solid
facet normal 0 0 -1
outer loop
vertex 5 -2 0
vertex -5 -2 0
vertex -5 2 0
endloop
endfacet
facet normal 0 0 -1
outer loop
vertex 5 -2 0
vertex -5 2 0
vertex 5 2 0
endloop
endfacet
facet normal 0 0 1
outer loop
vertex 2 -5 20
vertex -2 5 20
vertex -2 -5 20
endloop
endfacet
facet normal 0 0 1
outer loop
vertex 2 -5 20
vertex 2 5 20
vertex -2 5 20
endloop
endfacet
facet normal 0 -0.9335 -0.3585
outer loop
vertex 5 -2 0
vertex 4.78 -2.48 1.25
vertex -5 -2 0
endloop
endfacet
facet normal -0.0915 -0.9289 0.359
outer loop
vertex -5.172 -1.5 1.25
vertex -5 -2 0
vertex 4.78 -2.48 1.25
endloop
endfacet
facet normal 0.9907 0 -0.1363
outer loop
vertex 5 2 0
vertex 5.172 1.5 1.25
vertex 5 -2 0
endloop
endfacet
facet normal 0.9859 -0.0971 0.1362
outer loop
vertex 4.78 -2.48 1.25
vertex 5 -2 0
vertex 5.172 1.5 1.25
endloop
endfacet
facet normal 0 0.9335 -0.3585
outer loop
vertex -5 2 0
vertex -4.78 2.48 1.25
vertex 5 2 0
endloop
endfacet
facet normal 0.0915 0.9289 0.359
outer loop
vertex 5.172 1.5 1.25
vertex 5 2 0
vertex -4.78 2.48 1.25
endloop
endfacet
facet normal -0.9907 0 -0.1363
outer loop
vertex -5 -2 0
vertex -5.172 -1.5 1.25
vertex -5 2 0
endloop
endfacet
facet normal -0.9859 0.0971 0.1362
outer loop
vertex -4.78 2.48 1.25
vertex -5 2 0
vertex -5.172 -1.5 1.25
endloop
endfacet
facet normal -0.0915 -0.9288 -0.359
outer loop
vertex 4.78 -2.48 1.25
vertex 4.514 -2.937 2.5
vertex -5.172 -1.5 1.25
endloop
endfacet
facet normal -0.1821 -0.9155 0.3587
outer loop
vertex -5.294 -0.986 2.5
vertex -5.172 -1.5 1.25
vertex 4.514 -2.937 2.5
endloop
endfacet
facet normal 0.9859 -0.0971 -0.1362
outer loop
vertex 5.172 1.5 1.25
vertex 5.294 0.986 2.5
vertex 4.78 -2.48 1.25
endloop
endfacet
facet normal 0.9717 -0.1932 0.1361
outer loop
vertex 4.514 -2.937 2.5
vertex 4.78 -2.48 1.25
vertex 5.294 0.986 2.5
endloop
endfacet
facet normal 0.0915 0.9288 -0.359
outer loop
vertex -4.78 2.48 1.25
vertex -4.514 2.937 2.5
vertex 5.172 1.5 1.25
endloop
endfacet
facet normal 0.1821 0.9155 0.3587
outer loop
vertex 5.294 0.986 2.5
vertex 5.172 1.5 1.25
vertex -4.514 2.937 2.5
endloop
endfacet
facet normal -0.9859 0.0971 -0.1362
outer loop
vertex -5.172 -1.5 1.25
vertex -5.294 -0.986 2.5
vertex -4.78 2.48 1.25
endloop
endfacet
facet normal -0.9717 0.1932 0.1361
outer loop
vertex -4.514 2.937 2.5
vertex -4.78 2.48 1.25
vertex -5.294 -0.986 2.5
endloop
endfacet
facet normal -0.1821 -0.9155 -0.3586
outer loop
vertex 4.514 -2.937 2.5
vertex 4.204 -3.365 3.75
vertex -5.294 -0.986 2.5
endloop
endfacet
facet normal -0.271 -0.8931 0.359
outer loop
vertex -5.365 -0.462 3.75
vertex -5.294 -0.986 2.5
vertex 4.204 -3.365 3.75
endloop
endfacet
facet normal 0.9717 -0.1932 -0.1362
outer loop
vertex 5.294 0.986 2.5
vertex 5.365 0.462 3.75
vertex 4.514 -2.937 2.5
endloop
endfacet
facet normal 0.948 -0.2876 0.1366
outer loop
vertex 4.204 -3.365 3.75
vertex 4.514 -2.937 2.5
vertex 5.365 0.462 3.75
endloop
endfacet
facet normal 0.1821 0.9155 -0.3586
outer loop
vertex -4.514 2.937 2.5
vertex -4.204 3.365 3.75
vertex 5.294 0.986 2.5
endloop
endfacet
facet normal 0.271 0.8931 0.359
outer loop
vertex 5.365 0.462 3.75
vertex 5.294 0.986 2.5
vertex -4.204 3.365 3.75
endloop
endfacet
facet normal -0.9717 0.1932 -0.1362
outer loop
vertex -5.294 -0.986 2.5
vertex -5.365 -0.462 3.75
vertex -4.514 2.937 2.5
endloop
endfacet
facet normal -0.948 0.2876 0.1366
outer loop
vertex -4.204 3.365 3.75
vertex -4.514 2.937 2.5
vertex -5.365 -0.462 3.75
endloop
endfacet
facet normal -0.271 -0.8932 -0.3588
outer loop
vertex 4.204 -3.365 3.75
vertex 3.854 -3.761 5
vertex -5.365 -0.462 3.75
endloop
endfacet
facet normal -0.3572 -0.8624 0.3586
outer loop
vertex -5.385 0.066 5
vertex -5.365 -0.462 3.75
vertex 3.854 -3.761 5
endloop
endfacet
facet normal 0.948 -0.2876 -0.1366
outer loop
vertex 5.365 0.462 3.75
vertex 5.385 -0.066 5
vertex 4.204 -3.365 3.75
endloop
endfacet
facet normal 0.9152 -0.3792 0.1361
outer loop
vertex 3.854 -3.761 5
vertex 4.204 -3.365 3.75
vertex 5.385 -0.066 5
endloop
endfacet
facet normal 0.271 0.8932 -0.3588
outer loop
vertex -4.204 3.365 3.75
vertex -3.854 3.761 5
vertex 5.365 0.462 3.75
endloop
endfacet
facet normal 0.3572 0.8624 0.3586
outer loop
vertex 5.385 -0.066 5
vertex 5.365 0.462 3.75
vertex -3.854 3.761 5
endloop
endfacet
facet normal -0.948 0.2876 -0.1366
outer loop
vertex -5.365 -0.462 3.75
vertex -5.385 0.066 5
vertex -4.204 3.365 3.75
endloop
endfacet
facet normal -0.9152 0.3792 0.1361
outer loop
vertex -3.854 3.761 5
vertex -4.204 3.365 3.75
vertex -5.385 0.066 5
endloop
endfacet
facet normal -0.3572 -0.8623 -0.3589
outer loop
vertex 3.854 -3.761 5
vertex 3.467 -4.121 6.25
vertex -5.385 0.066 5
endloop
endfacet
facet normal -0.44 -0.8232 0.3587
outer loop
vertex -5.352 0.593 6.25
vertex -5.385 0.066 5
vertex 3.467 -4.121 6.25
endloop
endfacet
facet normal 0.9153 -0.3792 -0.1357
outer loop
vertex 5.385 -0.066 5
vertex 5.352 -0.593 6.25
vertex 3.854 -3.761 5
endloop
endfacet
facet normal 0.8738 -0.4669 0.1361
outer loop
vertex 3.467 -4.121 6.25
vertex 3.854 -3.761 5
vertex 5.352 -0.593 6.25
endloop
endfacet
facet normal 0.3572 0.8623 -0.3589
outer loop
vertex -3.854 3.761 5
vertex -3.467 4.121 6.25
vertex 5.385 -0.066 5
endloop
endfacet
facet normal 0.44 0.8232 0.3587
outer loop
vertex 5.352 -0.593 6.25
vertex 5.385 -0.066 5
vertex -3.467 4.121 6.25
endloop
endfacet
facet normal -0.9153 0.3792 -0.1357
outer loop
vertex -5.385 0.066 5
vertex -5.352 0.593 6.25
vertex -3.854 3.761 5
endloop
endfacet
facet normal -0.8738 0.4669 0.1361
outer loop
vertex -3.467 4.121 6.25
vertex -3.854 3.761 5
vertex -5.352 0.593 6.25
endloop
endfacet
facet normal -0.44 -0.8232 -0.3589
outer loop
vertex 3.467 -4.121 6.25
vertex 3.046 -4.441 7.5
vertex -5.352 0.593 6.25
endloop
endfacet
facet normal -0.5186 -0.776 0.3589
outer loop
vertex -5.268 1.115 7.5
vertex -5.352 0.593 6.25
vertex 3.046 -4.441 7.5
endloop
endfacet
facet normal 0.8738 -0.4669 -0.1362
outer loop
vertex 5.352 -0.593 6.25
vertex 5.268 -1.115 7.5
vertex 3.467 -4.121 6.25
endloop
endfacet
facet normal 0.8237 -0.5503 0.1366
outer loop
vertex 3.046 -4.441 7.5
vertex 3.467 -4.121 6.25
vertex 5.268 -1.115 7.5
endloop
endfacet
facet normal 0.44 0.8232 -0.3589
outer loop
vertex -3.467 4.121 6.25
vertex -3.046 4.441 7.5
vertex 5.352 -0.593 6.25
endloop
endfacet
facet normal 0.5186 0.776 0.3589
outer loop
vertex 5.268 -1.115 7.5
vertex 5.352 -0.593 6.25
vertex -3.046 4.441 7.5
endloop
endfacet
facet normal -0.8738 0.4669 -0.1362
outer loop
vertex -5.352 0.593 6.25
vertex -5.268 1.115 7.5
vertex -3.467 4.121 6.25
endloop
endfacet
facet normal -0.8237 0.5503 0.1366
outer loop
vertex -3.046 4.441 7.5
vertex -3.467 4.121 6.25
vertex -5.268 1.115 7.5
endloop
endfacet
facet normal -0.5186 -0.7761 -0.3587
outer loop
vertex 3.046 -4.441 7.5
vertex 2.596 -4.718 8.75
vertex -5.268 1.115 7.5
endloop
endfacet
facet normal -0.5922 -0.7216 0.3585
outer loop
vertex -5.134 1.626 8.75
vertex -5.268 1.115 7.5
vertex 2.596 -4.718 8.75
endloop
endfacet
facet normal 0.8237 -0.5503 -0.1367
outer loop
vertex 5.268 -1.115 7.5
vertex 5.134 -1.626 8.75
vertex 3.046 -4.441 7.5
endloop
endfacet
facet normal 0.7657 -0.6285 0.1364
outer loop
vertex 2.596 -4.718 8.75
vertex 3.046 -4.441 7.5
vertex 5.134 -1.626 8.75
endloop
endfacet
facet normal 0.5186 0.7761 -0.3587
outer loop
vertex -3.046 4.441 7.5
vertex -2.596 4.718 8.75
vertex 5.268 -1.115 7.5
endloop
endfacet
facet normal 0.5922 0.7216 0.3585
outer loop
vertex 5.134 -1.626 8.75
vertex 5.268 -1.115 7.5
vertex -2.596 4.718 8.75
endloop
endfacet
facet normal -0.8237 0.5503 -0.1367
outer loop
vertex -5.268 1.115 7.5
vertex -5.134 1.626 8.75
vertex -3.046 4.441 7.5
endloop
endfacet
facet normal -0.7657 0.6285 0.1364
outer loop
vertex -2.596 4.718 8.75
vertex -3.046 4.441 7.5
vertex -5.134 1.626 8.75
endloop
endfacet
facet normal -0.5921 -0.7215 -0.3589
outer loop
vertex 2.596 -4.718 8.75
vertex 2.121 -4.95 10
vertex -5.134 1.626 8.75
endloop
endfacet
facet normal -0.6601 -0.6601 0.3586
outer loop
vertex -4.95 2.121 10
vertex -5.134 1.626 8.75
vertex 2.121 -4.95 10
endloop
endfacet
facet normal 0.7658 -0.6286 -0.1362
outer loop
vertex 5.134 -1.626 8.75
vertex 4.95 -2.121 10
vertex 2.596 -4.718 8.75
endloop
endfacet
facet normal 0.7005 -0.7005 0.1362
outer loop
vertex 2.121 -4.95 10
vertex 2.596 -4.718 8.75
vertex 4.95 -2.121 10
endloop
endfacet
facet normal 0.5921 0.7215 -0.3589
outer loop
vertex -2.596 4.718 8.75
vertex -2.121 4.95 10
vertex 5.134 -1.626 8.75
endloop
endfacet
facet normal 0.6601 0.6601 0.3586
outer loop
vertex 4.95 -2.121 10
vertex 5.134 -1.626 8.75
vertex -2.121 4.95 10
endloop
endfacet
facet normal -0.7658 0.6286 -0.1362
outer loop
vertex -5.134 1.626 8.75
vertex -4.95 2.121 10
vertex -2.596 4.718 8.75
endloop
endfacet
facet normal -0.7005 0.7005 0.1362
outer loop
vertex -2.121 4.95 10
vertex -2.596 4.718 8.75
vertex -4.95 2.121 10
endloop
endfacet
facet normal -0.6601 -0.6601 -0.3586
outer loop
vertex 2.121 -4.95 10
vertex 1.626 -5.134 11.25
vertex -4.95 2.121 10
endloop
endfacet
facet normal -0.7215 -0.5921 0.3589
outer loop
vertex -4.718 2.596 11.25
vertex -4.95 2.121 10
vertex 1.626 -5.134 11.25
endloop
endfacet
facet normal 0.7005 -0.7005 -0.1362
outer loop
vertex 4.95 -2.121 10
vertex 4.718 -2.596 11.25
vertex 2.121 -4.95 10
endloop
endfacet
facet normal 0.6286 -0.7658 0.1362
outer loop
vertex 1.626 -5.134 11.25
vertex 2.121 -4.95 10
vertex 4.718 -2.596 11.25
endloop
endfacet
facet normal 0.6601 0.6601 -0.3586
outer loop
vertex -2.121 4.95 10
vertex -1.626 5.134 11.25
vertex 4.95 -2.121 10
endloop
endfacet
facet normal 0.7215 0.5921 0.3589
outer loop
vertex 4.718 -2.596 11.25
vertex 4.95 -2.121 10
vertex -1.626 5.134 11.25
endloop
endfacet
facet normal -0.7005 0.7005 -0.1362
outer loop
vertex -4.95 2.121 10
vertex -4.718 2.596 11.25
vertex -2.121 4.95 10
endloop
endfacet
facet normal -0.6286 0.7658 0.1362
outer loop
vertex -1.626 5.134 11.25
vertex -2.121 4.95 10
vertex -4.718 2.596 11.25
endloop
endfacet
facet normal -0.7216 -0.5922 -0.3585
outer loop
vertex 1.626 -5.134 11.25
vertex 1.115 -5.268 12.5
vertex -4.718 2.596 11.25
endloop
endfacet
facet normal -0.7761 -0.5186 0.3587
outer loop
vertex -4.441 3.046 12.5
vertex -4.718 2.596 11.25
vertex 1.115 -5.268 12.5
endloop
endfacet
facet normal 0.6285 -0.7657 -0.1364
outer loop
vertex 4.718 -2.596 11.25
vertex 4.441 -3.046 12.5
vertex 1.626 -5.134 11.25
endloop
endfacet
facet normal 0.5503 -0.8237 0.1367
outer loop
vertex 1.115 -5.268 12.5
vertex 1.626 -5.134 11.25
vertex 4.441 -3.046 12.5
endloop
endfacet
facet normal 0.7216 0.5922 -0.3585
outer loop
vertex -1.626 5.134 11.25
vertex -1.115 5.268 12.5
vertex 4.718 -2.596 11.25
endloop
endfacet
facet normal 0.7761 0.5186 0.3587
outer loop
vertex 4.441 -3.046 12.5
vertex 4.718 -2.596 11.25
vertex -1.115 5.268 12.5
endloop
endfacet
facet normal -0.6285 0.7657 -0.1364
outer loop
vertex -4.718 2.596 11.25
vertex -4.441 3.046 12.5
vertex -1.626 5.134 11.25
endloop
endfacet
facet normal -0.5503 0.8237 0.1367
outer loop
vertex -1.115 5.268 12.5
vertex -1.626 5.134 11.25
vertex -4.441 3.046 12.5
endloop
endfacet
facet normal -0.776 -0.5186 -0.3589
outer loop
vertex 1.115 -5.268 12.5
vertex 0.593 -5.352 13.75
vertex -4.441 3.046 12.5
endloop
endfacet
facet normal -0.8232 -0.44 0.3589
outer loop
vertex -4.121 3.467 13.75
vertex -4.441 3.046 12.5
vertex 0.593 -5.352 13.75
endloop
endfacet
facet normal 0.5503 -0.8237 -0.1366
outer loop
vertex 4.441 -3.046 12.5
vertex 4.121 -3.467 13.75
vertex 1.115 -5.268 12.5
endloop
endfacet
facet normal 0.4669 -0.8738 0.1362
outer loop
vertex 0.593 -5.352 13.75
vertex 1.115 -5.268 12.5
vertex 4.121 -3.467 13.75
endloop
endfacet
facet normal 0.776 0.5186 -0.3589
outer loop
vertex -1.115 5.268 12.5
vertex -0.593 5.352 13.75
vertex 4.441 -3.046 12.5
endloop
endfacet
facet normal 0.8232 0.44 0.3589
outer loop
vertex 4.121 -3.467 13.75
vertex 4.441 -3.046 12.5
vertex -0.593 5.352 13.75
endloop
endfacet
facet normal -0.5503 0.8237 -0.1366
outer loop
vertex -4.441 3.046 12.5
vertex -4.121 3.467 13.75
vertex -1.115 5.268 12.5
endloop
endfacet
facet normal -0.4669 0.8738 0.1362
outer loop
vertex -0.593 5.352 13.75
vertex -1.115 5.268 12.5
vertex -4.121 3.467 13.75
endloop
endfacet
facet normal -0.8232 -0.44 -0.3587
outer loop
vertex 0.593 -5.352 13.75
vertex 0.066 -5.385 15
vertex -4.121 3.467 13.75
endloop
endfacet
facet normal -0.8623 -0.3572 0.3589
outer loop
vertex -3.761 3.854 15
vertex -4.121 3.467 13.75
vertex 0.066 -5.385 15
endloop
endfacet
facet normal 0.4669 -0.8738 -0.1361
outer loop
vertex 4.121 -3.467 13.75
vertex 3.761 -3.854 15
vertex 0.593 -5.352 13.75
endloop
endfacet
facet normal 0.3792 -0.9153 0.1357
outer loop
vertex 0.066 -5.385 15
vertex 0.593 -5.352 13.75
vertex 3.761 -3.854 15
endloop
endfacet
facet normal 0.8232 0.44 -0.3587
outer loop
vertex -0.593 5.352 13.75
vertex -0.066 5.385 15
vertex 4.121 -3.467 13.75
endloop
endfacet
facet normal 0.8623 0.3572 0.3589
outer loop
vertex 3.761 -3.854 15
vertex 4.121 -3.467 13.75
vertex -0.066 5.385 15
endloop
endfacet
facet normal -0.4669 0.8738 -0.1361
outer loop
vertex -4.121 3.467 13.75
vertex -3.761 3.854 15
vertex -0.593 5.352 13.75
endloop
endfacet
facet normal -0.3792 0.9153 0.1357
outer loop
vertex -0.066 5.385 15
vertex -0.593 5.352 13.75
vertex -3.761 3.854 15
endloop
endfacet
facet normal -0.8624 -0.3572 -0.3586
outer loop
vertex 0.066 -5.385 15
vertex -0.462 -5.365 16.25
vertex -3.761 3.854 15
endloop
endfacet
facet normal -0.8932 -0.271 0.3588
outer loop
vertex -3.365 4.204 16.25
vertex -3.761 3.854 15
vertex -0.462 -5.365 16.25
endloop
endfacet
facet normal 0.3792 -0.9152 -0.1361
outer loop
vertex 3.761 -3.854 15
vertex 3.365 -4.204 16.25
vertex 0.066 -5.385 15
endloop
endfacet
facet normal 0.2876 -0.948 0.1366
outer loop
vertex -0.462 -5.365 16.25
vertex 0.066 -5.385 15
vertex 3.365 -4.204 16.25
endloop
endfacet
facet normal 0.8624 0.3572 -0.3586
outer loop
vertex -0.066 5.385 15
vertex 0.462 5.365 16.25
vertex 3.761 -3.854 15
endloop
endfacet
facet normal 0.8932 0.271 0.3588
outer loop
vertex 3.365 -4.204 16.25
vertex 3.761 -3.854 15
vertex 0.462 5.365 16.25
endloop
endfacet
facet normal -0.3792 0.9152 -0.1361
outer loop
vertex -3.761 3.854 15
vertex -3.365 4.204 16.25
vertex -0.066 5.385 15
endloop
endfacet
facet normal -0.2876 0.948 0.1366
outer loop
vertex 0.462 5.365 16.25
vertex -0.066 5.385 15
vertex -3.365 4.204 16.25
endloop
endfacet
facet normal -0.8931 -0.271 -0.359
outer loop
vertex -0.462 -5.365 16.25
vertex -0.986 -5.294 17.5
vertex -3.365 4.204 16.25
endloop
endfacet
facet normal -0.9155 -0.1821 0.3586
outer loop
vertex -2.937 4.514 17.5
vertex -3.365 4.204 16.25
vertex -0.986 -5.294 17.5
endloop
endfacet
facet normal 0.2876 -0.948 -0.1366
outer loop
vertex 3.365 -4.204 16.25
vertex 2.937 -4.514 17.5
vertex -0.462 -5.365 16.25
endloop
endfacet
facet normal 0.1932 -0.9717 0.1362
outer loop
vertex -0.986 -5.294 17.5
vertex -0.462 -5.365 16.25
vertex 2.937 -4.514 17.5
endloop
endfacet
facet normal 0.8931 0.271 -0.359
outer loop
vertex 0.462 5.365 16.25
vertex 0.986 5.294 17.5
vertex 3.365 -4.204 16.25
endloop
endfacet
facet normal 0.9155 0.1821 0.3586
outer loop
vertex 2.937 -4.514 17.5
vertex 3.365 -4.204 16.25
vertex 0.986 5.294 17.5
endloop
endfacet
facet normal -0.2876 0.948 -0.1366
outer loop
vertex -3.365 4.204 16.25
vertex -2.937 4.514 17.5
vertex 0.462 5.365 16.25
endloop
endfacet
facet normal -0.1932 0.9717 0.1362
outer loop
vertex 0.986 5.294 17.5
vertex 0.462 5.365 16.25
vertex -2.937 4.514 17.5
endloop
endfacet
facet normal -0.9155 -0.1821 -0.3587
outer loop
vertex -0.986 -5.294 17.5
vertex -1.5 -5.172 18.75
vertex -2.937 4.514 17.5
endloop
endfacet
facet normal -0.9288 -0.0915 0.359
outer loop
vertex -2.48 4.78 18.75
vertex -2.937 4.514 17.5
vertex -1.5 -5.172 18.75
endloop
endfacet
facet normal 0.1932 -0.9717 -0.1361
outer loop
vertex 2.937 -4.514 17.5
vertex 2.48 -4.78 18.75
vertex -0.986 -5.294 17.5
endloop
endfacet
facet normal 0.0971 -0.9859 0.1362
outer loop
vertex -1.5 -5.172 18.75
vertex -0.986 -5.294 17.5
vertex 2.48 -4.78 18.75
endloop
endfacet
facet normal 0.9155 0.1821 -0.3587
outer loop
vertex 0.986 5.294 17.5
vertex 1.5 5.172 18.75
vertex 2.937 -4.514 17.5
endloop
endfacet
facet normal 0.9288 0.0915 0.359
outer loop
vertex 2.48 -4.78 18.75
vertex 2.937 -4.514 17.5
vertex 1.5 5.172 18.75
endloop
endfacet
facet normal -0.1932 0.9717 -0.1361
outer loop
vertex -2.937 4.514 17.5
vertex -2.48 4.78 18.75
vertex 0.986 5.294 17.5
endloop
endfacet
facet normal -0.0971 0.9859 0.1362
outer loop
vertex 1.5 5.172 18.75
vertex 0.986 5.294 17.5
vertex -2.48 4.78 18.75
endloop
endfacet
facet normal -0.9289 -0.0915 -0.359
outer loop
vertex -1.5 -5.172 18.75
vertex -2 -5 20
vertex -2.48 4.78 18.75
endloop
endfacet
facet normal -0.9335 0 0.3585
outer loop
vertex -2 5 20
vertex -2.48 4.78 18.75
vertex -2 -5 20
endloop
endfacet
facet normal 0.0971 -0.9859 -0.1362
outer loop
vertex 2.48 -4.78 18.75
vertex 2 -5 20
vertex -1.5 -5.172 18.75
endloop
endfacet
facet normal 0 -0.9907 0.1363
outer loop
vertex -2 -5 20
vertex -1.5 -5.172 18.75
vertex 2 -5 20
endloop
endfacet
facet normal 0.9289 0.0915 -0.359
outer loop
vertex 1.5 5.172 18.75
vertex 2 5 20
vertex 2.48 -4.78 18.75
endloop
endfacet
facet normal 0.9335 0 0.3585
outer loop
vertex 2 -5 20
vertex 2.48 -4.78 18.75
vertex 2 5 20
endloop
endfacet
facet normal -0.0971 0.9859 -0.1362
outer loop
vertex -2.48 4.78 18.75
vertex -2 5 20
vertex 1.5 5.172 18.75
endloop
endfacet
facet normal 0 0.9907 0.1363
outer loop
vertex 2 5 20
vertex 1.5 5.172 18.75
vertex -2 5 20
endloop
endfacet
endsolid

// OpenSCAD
// What the exact passes leave behind, and how much room there is to fit it.
//
// A twisted extrusion sweeps a helicoid. It is exactly describable and it is
// not a quadric, so the exact pass refuses it - correctly, and that refusal has
// its own fixture in step-extrude-refusals. This one is about the question that
// comes after: given that four walls are going out as 2050 facets, what would
// it take to write them as surfaces instead, and how wrong could that be?
//
// The answer is the band. The mesh does not say where the true surface is; it
// says the surface passes through these vertices and cannot stray further from
// the facets than their own sagitta. For two facets meeting at a dihedral theta
// across a chord c, that is (c/2)*tan(theta/4). A fitted surface inside the band
// asserts nothing the mesh does not already allow; one outside it is inventing
// geometry.
//
// This model is the clean case, and it is here to be compared against a dirty
// one. Every wall is a uniformly tessellated sweep, so the widest band over any
// edge and the band over the typical edge are the same to within 4% - there are
// no bad edges. A boolean-trimmed body is not like that: the bayonet's hose
// thread measures a band of 0.78 against a typical 0.075, a ten-fold tail from
// the facets where the sweep was cut against the socket wall. Same measure, and
// it tells the two apart, which is the whole reason for reporting both.
//
// The band says how *accurate* a fit could be. Whether a fit is available at all
// is a separate question, and it is the one that decides this feature's fate.
// Fitting needs the facets' ordering - which follows which along the sweep - and
// nothing can recover that from an unordered set. A mesh straight from a
// generator still has it: a swept quad grid split into triangles the same way
// everywhere gives every interior vertex a valence of exactly 6, and this model
// measures 100% of 330. A mesh that has been through a boolean does not. The
// bayonet's thread, trimmed against its socket wall, measures 36%.
//
// So the two models answer the two halves differently, and together they say
// where each route applies: fit where the generator's grid survives, declare
// where the boolean took it.
//
// Nothing is fitted yet. The pass measures and says so out loud, because a pass
// which silently did nothing would look exactly like one which found nothing.
// APPROX: 6 smooth regions left faceted, 2050 facets in all
// APPROX: the tessellation leaves at most 0.0055 to fit inside
// APPROX: band 0.0053 (typical 0.0051)
// APPROX: grid 100% regular over 330 interior vertices at valence 6
// APPROX: the generator's ordering survives, a fit could be made
// APPROX: approximation is measuring only - all 6 regions stay faceted
// APPROX-NOT: approximation found nothing left to fit
linear_extrude(height = 20, twist = 90, $fn = 64) square([10, 4], center = true);
